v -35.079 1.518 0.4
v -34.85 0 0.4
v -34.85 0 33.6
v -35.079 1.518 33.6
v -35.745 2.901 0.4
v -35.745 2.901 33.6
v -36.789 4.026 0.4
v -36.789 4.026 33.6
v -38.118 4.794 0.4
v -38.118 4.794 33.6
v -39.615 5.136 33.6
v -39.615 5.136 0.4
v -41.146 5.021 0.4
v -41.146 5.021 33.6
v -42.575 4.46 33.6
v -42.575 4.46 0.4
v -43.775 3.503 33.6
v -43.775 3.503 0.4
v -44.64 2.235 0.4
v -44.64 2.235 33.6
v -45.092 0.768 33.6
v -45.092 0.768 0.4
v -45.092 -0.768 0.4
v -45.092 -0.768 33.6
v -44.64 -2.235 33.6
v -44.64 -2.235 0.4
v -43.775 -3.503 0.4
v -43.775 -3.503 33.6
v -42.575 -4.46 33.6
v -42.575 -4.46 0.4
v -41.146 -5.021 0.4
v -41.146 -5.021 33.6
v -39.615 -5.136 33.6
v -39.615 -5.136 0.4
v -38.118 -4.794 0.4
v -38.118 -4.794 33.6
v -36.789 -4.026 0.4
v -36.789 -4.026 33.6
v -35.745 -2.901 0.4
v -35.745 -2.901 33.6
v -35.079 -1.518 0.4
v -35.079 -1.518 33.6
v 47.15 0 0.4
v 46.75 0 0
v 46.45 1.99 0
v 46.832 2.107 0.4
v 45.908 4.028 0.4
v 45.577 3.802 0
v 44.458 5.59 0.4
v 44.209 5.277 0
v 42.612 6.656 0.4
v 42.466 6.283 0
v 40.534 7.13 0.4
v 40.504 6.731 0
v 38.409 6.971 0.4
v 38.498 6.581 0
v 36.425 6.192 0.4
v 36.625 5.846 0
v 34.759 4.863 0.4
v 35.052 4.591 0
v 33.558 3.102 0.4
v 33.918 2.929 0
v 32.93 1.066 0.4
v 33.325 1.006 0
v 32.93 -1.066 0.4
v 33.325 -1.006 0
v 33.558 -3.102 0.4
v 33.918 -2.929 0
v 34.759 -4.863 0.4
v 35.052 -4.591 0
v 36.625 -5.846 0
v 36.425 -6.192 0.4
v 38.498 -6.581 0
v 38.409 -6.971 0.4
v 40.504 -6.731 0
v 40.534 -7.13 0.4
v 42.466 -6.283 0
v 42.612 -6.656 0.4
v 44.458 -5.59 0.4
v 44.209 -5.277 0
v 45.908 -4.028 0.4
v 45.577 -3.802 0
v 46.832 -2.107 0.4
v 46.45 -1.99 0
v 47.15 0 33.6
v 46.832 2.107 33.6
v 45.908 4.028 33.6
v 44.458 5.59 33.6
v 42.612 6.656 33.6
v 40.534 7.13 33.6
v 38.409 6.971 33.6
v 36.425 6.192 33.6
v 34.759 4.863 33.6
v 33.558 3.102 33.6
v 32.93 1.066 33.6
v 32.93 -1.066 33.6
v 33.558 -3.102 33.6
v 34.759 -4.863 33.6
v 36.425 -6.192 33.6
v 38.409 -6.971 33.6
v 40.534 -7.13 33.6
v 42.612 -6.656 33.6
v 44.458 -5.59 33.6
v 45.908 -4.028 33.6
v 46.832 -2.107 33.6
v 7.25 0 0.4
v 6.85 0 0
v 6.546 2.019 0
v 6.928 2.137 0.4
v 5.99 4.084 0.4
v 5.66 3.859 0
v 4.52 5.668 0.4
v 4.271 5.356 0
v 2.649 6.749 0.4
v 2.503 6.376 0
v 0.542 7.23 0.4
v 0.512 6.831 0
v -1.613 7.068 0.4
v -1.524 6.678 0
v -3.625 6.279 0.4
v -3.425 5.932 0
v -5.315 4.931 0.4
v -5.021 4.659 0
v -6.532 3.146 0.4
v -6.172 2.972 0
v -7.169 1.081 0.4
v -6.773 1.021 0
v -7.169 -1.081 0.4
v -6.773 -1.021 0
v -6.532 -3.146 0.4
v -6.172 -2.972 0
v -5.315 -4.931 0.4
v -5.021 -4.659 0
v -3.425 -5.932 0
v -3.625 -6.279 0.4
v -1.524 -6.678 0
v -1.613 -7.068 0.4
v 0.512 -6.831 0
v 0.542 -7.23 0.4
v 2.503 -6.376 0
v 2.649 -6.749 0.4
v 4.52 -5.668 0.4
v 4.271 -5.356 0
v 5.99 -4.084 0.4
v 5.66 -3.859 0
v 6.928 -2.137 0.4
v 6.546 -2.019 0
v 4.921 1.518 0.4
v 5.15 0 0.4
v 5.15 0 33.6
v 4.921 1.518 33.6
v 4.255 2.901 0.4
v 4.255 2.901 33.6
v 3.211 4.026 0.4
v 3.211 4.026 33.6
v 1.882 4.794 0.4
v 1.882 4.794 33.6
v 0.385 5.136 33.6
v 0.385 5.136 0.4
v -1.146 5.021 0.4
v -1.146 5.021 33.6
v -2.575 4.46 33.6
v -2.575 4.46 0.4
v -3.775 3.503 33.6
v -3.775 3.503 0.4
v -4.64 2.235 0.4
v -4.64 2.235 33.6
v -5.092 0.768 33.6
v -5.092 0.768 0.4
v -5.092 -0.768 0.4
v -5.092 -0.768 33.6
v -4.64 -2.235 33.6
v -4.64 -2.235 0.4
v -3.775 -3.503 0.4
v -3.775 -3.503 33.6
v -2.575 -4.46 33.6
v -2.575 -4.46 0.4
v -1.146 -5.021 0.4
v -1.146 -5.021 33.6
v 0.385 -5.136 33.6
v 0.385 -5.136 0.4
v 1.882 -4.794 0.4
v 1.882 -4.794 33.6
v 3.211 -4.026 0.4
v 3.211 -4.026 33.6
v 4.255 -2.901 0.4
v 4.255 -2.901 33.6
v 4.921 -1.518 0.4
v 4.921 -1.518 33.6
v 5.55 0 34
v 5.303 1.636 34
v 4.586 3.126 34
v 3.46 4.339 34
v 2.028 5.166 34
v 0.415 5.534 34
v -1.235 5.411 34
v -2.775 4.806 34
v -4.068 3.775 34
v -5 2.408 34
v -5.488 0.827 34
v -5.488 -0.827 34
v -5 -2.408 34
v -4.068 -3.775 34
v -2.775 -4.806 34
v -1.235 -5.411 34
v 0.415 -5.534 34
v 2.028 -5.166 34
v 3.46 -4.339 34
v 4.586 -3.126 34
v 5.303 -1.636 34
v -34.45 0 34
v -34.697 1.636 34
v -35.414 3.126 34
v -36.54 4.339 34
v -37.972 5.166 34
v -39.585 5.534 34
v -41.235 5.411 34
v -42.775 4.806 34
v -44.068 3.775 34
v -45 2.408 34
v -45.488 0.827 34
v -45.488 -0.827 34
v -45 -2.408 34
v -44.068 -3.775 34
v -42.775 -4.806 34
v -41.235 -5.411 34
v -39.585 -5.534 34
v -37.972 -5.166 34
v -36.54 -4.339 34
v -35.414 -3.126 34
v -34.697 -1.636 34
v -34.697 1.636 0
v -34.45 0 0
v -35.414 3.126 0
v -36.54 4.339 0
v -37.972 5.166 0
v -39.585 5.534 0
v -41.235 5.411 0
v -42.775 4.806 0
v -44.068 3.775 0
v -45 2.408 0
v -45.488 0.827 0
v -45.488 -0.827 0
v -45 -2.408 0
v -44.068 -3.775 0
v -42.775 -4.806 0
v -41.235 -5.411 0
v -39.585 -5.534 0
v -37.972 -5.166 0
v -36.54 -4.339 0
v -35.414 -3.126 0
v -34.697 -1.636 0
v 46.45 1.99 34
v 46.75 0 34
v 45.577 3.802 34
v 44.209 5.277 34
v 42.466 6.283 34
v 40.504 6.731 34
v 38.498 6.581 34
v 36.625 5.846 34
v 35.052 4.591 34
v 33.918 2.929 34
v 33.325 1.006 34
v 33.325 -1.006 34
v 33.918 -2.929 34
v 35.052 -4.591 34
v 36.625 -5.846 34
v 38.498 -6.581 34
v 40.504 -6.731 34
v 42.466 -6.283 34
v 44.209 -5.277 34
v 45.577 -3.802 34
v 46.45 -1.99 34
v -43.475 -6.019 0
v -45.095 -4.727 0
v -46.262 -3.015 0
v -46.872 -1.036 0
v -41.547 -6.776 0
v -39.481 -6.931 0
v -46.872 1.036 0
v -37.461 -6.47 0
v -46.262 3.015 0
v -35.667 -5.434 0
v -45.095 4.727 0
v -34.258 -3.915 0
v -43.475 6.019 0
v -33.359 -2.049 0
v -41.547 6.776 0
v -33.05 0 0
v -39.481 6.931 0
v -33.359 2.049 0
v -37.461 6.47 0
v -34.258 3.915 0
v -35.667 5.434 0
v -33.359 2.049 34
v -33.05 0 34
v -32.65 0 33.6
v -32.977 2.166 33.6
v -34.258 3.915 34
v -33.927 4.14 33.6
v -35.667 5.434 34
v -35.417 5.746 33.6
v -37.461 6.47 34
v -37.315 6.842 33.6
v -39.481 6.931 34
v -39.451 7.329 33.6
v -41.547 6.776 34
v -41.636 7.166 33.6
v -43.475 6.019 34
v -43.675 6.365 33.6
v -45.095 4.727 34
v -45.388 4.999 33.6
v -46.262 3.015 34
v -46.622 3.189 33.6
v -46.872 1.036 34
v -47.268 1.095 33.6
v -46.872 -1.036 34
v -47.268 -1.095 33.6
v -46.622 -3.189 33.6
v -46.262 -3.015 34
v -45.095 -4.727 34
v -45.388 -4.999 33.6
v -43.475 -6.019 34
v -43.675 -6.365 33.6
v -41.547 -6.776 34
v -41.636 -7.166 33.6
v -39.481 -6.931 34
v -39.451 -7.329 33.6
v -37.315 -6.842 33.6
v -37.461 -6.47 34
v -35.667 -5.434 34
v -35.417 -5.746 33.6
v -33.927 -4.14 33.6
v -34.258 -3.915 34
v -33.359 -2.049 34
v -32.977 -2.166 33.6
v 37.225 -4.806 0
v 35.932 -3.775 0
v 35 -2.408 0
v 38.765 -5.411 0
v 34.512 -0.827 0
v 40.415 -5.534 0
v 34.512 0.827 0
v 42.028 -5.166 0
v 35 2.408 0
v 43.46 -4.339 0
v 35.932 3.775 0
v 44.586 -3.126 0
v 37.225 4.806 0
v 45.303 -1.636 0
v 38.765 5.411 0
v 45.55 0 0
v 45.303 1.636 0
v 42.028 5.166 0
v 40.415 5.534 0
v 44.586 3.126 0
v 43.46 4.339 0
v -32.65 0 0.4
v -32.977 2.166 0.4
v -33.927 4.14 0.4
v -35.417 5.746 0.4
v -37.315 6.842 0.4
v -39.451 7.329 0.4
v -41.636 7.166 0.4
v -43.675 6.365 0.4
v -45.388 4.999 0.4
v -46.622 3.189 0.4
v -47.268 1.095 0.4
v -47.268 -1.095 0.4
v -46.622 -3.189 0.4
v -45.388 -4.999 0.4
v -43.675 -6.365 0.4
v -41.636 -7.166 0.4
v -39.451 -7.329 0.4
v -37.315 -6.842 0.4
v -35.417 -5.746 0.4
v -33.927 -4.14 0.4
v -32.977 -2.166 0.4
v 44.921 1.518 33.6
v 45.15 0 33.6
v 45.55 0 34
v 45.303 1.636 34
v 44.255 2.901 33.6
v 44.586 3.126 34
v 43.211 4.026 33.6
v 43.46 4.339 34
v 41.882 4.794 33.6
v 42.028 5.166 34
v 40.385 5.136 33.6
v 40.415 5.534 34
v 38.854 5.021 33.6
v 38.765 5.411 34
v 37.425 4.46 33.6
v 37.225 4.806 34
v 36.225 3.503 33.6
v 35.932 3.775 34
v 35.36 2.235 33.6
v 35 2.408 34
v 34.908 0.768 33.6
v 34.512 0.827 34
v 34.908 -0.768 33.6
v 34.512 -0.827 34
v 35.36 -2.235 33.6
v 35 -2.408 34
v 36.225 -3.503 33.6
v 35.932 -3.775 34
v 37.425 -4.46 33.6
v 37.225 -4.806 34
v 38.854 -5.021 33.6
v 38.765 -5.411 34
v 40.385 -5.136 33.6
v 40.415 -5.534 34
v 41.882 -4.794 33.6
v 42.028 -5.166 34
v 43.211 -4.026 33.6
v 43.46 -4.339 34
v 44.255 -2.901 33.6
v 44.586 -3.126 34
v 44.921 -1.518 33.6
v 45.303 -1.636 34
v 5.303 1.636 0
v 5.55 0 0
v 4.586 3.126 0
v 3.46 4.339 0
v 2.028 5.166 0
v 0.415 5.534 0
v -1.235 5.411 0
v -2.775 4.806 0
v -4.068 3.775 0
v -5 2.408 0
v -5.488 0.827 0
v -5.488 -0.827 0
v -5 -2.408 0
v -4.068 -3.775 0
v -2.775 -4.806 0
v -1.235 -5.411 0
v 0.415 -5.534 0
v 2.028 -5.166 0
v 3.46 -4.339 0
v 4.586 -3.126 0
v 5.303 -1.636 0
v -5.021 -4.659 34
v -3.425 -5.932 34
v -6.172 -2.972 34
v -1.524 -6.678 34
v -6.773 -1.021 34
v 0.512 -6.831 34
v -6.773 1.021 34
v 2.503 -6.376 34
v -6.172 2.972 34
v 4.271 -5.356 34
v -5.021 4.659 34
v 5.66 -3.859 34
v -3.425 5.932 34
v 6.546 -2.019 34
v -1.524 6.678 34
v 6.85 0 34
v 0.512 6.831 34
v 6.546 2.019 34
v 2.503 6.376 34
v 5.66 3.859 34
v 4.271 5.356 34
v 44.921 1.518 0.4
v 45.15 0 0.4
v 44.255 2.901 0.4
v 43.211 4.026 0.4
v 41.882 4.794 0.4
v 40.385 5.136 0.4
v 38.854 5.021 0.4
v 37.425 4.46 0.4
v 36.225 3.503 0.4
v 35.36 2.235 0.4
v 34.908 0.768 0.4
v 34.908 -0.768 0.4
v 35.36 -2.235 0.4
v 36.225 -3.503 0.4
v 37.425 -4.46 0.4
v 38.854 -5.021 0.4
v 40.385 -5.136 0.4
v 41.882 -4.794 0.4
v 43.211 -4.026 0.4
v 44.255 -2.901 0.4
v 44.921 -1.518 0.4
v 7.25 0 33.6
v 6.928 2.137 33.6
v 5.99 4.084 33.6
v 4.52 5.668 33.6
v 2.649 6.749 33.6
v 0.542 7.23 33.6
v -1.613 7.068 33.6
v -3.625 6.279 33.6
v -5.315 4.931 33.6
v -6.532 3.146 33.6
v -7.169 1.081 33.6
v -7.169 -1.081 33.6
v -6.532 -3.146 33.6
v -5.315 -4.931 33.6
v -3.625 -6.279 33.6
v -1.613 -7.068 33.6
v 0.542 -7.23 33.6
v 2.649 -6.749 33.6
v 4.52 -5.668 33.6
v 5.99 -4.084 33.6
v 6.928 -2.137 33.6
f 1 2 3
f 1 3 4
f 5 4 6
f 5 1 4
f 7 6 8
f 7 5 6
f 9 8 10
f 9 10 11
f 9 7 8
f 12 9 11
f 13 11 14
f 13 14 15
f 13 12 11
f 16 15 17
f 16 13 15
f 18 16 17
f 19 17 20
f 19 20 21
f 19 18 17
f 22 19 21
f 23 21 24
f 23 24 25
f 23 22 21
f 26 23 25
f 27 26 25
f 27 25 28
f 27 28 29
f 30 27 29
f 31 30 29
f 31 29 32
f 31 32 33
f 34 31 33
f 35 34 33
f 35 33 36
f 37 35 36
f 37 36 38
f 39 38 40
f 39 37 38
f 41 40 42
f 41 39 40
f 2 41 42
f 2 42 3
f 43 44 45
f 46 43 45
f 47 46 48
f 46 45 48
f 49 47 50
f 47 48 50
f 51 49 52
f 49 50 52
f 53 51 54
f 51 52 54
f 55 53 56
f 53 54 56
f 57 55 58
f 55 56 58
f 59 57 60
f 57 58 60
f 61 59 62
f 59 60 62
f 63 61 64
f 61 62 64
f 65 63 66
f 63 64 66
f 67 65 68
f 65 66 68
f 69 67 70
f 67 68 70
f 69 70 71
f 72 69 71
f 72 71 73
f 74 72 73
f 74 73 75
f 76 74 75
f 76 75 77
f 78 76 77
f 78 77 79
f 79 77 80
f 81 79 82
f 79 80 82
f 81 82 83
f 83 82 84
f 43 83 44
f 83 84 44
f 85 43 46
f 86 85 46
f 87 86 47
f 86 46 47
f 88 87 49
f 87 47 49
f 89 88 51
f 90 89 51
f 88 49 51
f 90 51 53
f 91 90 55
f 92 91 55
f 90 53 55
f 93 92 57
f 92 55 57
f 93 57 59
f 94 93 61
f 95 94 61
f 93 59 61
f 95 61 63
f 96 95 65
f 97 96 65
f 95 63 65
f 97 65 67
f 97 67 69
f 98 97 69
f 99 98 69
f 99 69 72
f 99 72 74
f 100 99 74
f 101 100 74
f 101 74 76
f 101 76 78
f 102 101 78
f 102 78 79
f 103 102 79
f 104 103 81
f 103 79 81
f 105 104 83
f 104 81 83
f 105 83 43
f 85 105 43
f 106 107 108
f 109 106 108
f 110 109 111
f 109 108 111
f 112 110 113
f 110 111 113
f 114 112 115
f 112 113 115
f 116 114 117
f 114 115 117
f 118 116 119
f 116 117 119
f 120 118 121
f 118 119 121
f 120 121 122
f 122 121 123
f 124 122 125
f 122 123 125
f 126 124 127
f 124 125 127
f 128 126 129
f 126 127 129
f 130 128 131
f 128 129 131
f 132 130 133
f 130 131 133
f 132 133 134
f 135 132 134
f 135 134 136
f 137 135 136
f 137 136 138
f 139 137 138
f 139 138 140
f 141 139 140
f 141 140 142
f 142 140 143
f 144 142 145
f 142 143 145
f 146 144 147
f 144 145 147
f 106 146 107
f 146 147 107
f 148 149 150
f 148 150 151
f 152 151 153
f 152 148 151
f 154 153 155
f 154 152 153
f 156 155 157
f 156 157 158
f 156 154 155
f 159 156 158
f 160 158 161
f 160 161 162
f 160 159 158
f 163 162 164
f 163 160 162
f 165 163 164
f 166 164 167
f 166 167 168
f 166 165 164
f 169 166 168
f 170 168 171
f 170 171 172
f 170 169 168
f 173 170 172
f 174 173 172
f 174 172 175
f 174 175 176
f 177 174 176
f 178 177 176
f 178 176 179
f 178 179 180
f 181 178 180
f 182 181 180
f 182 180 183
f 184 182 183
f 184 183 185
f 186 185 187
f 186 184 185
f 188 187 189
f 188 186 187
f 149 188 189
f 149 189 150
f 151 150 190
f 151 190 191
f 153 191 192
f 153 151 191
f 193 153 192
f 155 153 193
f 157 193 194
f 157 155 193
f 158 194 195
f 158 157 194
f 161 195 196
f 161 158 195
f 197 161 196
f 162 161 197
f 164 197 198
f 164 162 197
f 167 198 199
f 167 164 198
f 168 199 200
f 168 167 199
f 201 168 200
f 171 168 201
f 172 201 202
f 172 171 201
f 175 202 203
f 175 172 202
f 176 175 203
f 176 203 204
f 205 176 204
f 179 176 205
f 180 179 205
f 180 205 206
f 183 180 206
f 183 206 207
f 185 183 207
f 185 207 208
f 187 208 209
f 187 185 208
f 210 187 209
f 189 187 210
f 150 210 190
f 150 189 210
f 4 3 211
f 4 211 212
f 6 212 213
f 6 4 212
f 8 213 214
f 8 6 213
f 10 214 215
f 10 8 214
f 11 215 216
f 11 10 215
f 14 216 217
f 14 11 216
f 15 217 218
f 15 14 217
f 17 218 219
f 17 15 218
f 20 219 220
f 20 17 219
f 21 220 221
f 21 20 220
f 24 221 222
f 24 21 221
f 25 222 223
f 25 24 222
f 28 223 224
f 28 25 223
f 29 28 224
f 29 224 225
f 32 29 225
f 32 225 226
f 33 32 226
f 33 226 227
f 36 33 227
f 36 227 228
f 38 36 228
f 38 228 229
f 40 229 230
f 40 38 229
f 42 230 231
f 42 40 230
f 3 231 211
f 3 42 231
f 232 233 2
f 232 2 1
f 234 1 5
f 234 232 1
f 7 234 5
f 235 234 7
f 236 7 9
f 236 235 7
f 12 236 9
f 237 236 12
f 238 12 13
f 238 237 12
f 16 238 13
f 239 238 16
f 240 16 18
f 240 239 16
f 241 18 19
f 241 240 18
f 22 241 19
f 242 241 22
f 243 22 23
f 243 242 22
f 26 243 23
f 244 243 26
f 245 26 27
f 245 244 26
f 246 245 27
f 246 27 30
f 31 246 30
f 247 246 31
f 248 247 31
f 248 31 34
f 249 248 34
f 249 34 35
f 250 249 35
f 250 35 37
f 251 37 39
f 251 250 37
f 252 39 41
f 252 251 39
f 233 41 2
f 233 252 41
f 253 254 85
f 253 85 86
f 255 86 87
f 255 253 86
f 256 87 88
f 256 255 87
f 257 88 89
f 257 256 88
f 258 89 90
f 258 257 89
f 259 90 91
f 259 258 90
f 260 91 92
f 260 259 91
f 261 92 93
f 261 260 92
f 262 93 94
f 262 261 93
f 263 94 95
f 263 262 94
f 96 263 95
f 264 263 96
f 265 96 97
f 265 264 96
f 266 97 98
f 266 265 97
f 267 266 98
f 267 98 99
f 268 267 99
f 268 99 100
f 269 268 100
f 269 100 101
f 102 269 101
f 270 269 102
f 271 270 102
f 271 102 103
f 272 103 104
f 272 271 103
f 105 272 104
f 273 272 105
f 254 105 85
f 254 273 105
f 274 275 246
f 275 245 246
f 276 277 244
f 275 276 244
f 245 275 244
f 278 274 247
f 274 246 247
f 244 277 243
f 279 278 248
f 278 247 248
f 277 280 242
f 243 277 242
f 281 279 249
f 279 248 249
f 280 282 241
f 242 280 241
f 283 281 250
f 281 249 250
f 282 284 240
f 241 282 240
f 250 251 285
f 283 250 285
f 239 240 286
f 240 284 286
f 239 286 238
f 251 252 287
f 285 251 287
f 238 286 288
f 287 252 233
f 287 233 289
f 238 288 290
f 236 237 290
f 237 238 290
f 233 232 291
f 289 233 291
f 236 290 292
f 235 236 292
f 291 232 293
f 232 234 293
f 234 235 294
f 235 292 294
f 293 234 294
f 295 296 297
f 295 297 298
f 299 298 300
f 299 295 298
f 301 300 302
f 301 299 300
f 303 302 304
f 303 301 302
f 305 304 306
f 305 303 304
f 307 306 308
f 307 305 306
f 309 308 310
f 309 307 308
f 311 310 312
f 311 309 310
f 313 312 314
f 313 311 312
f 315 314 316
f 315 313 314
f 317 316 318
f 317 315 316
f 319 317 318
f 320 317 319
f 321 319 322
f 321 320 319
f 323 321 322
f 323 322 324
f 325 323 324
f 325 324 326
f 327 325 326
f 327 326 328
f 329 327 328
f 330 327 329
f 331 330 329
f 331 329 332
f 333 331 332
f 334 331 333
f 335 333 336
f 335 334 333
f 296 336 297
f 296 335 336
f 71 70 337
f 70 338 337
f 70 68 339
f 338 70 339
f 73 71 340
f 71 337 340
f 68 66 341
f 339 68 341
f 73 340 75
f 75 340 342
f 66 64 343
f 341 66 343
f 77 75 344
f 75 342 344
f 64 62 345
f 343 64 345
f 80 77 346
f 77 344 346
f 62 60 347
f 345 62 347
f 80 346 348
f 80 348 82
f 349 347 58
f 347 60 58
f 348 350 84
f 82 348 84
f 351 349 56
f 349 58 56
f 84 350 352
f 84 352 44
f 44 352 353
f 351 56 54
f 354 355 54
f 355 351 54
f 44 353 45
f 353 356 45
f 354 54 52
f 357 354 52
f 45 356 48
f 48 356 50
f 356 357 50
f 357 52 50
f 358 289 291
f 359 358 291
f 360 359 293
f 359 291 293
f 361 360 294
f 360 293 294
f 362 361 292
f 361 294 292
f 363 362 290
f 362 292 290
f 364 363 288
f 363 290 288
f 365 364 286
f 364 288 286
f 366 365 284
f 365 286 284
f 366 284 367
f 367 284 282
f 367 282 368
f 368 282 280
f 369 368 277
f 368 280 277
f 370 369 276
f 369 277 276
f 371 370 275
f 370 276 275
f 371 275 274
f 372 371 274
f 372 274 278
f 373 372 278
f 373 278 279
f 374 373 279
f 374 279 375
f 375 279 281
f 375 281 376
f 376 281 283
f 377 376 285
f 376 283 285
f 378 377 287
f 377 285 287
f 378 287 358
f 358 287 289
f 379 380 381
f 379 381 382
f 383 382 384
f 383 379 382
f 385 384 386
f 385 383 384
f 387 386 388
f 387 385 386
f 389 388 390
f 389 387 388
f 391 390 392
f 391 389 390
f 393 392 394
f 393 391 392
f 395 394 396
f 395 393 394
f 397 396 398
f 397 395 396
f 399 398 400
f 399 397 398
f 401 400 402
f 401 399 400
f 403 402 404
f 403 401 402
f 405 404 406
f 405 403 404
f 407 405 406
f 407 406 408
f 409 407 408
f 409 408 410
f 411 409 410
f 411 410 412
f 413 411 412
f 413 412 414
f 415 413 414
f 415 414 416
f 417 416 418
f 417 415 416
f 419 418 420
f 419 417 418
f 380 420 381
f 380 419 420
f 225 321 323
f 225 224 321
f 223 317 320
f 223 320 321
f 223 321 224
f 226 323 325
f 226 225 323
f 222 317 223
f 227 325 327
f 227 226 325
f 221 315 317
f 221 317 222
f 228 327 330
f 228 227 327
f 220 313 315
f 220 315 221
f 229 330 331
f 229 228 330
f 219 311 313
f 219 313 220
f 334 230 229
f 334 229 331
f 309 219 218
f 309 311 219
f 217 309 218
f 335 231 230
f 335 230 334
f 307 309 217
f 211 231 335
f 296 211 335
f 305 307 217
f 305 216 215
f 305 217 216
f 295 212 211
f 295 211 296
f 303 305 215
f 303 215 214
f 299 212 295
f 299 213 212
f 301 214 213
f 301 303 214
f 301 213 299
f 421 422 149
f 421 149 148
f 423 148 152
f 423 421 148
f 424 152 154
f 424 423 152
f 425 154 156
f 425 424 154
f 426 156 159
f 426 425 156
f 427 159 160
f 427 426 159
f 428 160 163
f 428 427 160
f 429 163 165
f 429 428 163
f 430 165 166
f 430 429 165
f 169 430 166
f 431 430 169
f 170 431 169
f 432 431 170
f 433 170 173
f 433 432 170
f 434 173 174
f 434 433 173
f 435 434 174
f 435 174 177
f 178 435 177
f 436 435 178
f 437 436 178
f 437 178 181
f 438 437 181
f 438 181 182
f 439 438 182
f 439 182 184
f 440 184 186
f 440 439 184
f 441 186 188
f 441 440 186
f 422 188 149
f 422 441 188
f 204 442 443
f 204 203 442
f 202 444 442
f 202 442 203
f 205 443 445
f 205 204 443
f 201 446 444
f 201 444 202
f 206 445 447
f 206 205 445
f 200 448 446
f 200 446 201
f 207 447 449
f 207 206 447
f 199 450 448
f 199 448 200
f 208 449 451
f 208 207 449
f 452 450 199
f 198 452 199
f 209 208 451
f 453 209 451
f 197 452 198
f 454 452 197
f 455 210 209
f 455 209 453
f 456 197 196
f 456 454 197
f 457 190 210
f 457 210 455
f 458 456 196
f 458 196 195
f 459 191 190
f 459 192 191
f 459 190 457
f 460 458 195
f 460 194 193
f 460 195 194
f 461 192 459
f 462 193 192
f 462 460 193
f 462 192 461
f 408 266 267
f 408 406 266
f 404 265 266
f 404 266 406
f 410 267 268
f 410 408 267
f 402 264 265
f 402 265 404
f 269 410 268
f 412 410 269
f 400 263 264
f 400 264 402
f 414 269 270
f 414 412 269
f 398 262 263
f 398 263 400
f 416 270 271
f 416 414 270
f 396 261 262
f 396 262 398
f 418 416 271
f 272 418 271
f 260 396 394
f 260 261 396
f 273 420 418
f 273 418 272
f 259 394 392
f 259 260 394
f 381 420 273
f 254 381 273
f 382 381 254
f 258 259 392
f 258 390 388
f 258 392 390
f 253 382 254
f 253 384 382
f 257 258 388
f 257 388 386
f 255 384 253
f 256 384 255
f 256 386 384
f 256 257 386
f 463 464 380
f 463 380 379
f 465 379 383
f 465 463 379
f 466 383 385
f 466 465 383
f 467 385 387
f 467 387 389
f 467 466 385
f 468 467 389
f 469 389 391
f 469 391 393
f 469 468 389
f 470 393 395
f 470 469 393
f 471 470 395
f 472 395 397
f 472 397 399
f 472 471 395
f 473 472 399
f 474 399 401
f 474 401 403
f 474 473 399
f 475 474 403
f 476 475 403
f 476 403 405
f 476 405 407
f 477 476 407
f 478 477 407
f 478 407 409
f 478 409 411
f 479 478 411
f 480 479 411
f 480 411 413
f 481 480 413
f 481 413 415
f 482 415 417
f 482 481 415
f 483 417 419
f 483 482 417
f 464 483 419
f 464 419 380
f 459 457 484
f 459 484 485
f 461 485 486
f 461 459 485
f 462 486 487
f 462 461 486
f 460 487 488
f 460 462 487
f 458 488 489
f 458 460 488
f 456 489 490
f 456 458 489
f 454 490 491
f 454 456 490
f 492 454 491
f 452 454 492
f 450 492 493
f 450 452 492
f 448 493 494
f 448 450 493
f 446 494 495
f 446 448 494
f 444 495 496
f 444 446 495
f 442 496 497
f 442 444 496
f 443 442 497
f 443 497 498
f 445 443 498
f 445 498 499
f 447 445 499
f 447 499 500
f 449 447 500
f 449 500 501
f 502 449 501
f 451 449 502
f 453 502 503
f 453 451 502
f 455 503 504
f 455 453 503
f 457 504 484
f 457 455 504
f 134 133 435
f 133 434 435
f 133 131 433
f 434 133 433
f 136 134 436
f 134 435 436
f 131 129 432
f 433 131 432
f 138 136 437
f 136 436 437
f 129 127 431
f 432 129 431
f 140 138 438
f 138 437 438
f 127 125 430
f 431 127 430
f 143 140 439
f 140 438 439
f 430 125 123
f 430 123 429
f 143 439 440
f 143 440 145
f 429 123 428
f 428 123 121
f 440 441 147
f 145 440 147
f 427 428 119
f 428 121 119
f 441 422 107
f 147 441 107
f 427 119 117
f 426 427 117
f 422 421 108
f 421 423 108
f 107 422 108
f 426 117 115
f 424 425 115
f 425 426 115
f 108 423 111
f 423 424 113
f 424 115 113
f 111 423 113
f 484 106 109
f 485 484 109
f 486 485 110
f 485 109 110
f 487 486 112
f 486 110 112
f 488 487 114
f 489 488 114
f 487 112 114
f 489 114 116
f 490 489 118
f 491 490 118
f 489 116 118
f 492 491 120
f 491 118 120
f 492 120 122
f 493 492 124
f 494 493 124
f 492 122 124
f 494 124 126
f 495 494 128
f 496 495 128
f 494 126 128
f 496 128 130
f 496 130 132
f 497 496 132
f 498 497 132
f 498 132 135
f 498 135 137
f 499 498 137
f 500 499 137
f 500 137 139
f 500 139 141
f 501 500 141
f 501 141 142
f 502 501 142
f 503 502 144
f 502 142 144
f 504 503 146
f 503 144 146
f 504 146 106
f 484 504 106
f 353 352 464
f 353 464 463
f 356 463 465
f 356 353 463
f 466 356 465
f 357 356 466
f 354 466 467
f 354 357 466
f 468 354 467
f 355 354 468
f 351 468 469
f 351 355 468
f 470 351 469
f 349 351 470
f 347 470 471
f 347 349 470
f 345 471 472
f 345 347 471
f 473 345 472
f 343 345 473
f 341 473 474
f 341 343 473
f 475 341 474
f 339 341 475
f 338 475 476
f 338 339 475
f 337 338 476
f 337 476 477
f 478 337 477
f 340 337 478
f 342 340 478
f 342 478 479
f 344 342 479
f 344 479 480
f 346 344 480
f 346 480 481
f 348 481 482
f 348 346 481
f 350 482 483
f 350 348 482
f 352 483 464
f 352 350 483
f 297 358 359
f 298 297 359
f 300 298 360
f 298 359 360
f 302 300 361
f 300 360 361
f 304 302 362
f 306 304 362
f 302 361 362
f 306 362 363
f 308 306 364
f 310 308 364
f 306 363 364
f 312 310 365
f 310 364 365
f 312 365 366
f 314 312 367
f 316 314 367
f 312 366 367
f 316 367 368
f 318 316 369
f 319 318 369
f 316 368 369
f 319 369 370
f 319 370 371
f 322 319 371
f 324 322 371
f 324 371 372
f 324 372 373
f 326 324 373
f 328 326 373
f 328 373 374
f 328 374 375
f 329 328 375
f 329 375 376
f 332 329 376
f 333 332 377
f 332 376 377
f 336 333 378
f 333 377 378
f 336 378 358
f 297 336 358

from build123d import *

# Parameters (mm, degrees)
F0_R     = 7.25
F0_R_2   = 5.15
F0_R_3   = 7.35
F0_R_4   = 7.15
F1_DEPTH = 34
F2_SIZE  = 0.4
F3_SIZE  = 0.4


with BuildPart() as f1:
    # F0 (on Top) → F1 (new body)
    with BuildSketch(Plane.XY):
        Circle(F0_R)
        Circle(F0_R_2, mode=Mode.SUBTRACT)
        with Locations((-40, 0)):
            Circle(F0_R_3)
        with Locations((-40, 0)):
            Circle(F0_R_2, mode=Mode.SUBTRACT)
        with Locations((40, 0)):
            Circle(F0_R_4)
        with Locations((40, 0)):
            Circle(F0_R_2, mode=Mode.SUBTRACT)
    extrude(amount=F1_DEPTH)

    # F2
    f2_edges = [f1.edges().sort_by_distance(p)[0] for p in [
        (-7.25, 0, 0),
        (-47.35, 0, 0),
        (-45.15, 0, 0),
        (32.85, 0, 0),
        (34.85, 0, 0),
        (-5.15, 0, 0),
    ]]
    chamfer(f2_edges, length=F2_SIZE)

    # F3
    f3_edges = [f1.edges().sort_by_distance(p)[0] for p in [
        (-7.25, 0, 34),
        (-47.35, 0, 34),
        (-45.15, 0, 34),
        (32.85, 0, 34),
        (34.85, 0, 34),
        (-5.15, 0, 34),
    ]]
    chamfer(f3_edges, length=F3_SIZE)


solid = f1.part
